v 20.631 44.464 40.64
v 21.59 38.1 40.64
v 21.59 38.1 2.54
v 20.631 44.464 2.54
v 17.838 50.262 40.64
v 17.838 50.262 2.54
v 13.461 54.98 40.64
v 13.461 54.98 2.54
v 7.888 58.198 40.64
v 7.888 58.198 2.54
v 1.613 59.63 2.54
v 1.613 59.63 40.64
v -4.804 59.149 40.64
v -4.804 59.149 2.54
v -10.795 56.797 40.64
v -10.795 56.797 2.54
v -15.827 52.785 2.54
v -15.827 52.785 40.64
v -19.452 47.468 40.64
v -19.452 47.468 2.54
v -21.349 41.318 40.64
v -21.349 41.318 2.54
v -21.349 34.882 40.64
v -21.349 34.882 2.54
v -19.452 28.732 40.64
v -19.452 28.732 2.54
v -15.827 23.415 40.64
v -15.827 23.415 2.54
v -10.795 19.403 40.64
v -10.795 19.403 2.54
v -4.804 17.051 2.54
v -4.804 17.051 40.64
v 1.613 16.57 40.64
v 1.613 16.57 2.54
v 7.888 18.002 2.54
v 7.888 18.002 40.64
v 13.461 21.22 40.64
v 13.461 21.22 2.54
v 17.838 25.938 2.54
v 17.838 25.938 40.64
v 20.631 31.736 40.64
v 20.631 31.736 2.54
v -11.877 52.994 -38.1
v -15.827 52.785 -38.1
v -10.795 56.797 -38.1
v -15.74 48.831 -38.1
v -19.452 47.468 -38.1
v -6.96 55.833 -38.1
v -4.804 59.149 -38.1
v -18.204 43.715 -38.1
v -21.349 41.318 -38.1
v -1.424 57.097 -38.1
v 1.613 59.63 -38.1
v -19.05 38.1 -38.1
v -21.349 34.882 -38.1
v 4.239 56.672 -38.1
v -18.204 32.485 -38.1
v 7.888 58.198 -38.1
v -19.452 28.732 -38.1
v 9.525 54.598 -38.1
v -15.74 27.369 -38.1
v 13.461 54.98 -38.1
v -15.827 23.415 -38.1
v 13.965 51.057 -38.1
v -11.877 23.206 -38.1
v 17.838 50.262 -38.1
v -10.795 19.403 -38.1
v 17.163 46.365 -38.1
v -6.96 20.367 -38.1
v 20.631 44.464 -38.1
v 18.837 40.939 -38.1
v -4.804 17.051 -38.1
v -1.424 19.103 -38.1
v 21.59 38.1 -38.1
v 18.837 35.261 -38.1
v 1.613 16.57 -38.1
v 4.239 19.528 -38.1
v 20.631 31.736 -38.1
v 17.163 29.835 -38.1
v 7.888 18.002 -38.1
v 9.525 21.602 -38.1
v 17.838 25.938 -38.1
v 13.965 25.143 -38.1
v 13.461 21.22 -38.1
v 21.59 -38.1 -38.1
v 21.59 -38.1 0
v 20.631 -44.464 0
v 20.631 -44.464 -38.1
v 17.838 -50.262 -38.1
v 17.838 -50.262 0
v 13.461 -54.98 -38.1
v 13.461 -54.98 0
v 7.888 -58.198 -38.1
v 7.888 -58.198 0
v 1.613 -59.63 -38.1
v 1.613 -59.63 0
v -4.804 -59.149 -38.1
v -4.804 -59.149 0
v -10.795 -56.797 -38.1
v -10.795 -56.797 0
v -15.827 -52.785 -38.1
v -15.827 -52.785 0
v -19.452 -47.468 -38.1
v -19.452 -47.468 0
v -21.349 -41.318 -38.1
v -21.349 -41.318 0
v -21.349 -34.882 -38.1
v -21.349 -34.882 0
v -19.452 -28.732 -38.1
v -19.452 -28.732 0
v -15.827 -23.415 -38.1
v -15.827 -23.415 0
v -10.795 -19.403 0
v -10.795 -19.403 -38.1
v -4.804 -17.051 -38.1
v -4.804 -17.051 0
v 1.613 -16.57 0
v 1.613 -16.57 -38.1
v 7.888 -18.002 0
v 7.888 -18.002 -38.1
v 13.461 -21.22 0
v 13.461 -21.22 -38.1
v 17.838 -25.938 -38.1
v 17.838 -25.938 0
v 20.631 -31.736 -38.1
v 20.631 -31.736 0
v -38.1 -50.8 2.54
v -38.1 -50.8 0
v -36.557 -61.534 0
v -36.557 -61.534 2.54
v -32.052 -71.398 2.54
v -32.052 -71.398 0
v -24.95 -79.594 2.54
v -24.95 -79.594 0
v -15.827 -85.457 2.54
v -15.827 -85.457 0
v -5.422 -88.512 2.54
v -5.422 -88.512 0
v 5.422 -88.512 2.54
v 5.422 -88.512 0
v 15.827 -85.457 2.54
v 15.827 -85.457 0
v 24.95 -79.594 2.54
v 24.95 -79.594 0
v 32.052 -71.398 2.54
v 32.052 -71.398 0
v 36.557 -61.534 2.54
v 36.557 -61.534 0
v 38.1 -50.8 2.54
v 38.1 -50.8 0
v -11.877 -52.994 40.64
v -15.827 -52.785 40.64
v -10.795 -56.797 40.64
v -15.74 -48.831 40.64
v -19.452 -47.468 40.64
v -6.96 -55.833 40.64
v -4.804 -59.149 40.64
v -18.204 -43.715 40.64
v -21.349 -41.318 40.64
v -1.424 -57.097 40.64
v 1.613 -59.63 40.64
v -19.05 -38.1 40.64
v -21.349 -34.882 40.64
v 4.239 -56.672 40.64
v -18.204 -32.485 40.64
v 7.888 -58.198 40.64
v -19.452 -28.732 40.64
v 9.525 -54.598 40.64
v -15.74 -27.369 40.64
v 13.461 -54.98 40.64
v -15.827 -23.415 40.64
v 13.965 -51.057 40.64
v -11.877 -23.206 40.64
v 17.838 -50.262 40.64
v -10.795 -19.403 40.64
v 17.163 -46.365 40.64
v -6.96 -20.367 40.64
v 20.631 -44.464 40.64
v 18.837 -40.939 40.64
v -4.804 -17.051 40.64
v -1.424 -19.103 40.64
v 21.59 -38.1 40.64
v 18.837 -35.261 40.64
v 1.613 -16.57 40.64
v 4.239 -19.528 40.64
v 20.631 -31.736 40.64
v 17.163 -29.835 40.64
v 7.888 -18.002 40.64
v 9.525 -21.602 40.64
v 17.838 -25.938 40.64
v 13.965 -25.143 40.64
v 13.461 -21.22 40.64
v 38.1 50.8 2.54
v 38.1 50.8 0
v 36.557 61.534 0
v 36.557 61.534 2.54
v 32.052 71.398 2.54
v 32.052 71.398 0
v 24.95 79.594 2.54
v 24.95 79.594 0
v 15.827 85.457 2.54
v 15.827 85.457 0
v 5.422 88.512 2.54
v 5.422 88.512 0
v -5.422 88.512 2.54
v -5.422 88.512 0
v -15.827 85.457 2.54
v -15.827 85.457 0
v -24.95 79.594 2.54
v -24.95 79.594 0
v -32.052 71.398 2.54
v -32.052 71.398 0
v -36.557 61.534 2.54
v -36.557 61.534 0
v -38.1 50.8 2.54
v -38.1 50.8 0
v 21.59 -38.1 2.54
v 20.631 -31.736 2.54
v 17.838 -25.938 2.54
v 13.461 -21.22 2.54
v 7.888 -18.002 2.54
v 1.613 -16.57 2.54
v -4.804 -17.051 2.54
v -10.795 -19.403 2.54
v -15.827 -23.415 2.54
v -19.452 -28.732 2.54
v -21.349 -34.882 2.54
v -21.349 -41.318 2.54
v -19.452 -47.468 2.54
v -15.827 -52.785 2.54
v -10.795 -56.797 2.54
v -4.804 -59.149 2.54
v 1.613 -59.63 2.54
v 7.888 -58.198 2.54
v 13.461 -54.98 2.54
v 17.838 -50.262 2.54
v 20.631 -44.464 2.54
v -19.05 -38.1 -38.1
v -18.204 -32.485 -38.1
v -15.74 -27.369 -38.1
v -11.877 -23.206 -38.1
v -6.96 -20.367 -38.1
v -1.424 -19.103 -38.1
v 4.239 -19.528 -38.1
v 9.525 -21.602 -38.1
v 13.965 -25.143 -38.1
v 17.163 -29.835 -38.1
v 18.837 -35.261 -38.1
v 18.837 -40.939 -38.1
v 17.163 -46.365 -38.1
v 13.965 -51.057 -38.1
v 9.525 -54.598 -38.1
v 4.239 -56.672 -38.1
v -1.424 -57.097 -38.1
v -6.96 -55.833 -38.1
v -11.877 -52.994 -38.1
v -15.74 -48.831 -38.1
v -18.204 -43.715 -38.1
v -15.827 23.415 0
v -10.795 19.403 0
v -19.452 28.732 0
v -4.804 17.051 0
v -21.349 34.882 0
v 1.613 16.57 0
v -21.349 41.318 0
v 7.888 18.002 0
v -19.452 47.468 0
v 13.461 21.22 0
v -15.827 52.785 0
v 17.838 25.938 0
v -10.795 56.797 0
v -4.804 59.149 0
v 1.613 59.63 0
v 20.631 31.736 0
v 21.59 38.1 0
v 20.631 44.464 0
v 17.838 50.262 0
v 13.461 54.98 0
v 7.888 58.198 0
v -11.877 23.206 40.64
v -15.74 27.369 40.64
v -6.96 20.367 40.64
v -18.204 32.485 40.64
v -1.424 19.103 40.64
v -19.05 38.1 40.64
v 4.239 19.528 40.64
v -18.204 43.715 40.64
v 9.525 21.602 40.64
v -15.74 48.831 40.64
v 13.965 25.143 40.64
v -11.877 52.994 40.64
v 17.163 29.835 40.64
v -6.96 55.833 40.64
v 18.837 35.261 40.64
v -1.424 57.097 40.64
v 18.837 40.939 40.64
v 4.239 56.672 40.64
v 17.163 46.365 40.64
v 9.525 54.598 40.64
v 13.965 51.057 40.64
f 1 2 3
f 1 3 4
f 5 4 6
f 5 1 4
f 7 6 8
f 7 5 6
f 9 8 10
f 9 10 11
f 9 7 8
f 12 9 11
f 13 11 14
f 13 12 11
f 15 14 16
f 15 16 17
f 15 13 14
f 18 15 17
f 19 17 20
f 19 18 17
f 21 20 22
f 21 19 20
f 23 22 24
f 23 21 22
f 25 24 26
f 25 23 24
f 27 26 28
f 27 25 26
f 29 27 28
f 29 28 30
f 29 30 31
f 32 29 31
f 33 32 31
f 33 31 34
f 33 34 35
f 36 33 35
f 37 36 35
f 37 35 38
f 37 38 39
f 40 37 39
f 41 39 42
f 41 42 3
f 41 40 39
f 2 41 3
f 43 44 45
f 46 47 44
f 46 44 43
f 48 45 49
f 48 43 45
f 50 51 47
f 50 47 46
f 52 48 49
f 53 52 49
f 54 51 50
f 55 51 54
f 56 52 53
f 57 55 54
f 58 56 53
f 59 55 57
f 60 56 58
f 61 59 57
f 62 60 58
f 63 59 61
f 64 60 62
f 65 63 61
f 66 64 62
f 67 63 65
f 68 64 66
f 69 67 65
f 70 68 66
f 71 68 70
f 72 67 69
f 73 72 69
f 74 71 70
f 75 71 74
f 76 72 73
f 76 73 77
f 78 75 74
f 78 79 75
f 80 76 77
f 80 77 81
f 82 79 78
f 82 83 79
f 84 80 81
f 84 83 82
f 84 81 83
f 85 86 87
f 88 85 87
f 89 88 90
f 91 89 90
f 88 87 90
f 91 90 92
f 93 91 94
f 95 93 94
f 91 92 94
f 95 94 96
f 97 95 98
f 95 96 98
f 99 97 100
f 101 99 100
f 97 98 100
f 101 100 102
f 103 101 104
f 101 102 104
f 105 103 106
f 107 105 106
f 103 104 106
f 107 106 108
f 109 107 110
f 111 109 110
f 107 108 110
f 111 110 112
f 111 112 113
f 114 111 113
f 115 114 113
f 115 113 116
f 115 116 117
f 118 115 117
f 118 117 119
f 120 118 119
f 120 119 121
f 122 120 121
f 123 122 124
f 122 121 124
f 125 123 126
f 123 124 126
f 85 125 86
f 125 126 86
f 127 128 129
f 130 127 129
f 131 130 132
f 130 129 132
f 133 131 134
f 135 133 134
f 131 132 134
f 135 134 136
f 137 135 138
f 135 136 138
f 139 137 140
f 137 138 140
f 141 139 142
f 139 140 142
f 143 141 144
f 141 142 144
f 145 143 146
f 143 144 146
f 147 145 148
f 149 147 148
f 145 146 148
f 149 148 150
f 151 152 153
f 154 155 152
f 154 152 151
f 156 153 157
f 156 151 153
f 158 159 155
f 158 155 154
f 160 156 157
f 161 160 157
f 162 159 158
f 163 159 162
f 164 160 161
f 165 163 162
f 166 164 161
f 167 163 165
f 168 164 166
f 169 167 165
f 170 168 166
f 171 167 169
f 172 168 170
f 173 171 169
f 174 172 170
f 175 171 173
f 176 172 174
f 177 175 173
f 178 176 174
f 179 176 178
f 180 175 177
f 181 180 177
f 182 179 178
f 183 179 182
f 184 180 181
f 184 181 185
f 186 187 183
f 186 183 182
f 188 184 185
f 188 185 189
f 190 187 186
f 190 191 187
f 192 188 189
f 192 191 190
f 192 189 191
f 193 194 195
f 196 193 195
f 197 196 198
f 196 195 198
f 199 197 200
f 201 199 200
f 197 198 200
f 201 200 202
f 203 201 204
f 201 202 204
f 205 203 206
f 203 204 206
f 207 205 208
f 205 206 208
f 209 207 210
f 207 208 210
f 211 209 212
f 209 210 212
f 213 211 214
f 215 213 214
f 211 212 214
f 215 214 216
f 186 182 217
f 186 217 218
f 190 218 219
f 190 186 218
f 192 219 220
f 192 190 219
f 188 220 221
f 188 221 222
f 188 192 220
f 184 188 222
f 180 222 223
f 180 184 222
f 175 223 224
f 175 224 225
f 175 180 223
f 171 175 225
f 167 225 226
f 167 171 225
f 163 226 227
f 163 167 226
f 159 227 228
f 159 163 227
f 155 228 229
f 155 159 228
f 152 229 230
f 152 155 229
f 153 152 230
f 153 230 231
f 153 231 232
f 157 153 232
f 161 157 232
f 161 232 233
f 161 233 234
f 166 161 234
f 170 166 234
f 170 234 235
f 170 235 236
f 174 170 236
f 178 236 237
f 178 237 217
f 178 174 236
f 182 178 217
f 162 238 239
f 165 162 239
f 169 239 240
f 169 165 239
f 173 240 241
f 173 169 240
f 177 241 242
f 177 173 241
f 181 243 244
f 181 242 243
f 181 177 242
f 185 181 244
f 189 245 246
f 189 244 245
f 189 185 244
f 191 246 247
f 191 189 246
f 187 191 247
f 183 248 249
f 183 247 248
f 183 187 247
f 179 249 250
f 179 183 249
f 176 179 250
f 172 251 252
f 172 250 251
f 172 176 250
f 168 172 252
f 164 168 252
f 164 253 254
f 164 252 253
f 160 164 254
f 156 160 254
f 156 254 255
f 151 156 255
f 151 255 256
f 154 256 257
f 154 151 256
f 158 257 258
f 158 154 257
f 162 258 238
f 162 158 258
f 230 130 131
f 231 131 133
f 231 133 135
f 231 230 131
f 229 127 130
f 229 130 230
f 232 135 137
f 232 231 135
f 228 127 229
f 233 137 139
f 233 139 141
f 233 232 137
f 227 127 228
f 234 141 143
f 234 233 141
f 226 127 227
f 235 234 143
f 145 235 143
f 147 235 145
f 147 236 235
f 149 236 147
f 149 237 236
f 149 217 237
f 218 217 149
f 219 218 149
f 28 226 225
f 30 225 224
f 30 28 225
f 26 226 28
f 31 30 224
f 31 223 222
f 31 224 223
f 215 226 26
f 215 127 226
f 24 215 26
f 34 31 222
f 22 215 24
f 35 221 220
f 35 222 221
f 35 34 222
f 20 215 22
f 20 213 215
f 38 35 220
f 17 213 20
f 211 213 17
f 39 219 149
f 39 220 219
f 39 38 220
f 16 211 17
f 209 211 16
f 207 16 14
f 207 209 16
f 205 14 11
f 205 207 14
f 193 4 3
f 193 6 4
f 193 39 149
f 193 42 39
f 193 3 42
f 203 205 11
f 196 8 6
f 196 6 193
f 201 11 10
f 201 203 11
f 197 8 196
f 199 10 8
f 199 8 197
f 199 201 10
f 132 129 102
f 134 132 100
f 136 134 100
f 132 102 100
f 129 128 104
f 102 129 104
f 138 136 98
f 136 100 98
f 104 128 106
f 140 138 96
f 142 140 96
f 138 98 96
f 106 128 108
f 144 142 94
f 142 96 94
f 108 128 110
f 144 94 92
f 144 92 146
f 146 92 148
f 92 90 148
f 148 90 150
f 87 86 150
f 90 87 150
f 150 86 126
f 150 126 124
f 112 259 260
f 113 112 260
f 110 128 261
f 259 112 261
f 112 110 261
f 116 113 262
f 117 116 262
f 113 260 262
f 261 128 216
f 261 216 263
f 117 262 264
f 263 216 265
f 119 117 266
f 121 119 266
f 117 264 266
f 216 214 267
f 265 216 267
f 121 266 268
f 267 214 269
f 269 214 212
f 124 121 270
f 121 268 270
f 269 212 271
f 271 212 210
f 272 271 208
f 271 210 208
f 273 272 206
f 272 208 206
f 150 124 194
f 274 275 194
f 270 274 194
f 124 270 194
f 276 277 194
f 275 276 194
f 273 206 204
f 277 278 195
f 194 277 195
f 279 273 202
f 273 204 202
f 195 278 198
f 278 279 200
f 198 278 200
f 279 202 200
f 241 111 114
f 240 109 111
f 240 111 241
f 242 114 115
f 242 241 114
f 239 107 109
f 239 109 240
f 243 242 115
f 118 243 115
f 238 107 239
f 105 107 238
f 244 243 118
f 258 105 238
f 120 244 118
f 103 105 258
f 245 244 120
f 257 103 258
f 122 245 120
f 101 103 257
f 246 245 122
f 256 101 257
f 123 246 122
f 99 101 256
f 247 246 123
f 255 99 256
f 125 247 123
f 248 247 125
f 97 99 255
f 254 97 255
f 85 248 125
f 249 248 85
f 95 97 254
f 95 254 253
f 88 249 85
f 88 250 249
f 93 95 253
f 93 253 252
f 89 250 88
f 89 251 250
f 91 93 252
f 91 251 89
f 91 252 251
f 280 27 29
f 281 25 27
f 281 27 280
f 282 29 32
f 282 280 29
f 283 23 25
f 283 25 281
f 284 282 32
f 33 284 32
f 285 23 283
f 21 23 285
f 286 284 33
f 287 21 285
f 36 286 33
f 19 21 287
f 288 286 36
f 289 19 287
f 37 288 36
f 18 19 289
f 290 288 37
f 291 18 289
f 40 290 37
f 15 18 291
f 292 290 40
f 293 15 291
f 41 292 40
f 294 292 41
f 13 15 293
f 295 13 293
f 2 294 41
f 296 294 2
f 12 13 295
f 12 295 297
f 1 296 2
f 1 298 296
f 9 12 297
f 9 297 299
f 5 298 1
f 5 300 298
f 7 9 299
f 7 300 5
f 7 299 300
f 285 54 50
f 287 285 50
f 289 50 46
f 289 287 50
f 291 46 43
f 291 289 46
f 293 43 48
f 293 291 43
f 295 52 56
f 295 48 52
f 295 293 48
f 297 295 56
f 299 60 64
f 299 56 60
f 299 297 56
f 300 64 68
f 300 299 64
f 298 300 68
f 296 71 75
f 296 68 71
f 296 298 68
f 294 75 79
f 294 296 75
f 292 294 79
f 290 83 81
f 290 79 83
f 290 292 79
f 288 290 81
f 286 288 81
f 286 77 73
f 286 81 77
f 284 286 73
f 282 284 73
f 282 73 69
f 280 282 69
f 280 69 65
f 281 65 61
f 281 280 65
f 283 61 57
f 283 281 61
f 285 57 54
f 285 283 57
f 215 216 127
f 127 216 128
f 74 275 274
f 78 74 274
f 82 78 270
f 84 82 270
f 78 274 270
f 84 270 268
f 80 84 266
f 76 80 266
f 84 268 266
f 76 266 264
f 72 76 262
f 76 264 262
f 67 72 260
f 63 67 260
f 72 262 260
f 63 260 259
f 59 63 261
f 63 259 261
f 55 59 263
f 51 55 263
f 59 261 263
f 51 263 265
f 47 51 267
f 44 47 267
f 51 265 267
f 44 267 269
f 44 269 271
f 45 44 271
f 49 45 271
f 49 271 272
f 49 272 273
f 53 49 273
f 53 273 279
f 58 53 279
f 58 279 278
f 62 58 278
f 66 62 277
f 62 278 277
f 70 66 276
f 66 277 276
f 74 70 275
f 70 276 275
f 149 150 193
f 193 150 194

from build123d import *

# Parameters (mm, degrees)
BOSS_EXTRUDE1_DEPTH     = 2.54
SKETCH5_R               = 21.59
BOSS_EXTRUDE5_DEPTH     = 38.1
BOSS_EXTRUDE6_START     = 38.1
SKETCH2_R               = 21.59
BOSS_EXTRUDE6_DEPTH     = 38.1
CUT_EXTRUDE2_DEPTH      = 125.718914363
CUT_EXTRUDE2_DEPTH_BACK = 125.718914363
SKETCH6_R               = 19.05


with BuildPart() as part:
    # Sketch1 → Boss-Extrude1 (new body)
    with BuildSketch(Plane.XY):
        with BuildLine():
            Line((38.1, 50.8), (0, 50.8))
            Line((0, 50.8), (-38.1, 50.8))
            ThreePointArc((-38.1, 50.8), (0, 12.7), (38.1, 50.8))
        make_face()
        with BuildLine():
            Line((-38.1, 50.8), (0, 50.8))
            Line((0, 50.8), (38.1, 50.8))
            ThreePointArc((38.1, 50.8), (0, 88.9), (-38.1, 50.8))
        make_face()
        with BuildLine():
            ThreePointArc((38.1, 50.8), (0, 12.7), (-38.1, 50.8))
            Line((-38.1, 50.8), (-38.1, -50.8))
            ThreePointArc((-38.1, -50.8), (0, -12.7), (38.1, -50.8))
            Line((38.1, -50.8), (38.1, 50.8))
        make_face()
        with BuildLine():
            ThreePointArc((38.1, -50.8), (0, -12.7), (-38.1, -50.8))
            Line((-38.1, -50.8), (0, -50.8))
            Line((0, -50.8), (38.1, -50.8))
        make_face()
        with BuildLine():
            Line((0, -50.8), (-38.1, -50.8))
            ThreePointArc((-38.1, -50.8), (0, -88.9), (38.1, -50.8))
            Line((38.1, -50.8), (0, -50.8))
        make_face()
    extrude(amount=BOSS_EXTRUDE1_DEPTH)

    # Sketch5 → Boss-Extrude5 (add)
    with BuildSketch(Plane(origin=(0, 0, 0), x_dir=(-1, 0, 0), z_dir=(0, 0, -1))):
        with Locations(Location((0, 38.1, 0), (0, 0, 180))):
            Circle(SKETCH5_R)
        with Locations(Location((0, -38.1, 0), (0, 0, 180))):
            Circle(SKETCH5_R)
    extrude(amount=BOSS_EXTRUDE5_DEPTH)

    # Sketch2 → Boss-Extrude6 (add)
    with BuildSketch(Plane.XY.offset(2.54).offset(BOSS_EXTRUDE6_START)):
        with Locations((0, 38.1)):
            Circle(SKETCH2_R)
        with Locations((0, -38.1)):
            Circle(SKETCH2_R)
    extrude(amount=-BOSS_EXTRUDE6_DEPTH)

    # Sketch6 → Cut-Extrude2 (cut, two sides: drawn at the far end of the back side and taken through both)
    with BuildSketch(Plane(origin=(0, 0, -38.1), x_dir=(-1, 0, 0), z_dir=(0, 0, -1)).offset(-CUT_EXTRUDE2_DEPTH_BACK)):
        with Locations((0, 38.1)):
            Circle(SKETCH6_R)
        with Locations((0, -38.1)):
            Circle(SKETCH6_R)
    extrude(amount=CUT_EXTRUDE2_DEPTH + CUT_EXTRUDE2_DEPTH_BACK, mode=Mode.SUBTRACT)


solid = part.part
